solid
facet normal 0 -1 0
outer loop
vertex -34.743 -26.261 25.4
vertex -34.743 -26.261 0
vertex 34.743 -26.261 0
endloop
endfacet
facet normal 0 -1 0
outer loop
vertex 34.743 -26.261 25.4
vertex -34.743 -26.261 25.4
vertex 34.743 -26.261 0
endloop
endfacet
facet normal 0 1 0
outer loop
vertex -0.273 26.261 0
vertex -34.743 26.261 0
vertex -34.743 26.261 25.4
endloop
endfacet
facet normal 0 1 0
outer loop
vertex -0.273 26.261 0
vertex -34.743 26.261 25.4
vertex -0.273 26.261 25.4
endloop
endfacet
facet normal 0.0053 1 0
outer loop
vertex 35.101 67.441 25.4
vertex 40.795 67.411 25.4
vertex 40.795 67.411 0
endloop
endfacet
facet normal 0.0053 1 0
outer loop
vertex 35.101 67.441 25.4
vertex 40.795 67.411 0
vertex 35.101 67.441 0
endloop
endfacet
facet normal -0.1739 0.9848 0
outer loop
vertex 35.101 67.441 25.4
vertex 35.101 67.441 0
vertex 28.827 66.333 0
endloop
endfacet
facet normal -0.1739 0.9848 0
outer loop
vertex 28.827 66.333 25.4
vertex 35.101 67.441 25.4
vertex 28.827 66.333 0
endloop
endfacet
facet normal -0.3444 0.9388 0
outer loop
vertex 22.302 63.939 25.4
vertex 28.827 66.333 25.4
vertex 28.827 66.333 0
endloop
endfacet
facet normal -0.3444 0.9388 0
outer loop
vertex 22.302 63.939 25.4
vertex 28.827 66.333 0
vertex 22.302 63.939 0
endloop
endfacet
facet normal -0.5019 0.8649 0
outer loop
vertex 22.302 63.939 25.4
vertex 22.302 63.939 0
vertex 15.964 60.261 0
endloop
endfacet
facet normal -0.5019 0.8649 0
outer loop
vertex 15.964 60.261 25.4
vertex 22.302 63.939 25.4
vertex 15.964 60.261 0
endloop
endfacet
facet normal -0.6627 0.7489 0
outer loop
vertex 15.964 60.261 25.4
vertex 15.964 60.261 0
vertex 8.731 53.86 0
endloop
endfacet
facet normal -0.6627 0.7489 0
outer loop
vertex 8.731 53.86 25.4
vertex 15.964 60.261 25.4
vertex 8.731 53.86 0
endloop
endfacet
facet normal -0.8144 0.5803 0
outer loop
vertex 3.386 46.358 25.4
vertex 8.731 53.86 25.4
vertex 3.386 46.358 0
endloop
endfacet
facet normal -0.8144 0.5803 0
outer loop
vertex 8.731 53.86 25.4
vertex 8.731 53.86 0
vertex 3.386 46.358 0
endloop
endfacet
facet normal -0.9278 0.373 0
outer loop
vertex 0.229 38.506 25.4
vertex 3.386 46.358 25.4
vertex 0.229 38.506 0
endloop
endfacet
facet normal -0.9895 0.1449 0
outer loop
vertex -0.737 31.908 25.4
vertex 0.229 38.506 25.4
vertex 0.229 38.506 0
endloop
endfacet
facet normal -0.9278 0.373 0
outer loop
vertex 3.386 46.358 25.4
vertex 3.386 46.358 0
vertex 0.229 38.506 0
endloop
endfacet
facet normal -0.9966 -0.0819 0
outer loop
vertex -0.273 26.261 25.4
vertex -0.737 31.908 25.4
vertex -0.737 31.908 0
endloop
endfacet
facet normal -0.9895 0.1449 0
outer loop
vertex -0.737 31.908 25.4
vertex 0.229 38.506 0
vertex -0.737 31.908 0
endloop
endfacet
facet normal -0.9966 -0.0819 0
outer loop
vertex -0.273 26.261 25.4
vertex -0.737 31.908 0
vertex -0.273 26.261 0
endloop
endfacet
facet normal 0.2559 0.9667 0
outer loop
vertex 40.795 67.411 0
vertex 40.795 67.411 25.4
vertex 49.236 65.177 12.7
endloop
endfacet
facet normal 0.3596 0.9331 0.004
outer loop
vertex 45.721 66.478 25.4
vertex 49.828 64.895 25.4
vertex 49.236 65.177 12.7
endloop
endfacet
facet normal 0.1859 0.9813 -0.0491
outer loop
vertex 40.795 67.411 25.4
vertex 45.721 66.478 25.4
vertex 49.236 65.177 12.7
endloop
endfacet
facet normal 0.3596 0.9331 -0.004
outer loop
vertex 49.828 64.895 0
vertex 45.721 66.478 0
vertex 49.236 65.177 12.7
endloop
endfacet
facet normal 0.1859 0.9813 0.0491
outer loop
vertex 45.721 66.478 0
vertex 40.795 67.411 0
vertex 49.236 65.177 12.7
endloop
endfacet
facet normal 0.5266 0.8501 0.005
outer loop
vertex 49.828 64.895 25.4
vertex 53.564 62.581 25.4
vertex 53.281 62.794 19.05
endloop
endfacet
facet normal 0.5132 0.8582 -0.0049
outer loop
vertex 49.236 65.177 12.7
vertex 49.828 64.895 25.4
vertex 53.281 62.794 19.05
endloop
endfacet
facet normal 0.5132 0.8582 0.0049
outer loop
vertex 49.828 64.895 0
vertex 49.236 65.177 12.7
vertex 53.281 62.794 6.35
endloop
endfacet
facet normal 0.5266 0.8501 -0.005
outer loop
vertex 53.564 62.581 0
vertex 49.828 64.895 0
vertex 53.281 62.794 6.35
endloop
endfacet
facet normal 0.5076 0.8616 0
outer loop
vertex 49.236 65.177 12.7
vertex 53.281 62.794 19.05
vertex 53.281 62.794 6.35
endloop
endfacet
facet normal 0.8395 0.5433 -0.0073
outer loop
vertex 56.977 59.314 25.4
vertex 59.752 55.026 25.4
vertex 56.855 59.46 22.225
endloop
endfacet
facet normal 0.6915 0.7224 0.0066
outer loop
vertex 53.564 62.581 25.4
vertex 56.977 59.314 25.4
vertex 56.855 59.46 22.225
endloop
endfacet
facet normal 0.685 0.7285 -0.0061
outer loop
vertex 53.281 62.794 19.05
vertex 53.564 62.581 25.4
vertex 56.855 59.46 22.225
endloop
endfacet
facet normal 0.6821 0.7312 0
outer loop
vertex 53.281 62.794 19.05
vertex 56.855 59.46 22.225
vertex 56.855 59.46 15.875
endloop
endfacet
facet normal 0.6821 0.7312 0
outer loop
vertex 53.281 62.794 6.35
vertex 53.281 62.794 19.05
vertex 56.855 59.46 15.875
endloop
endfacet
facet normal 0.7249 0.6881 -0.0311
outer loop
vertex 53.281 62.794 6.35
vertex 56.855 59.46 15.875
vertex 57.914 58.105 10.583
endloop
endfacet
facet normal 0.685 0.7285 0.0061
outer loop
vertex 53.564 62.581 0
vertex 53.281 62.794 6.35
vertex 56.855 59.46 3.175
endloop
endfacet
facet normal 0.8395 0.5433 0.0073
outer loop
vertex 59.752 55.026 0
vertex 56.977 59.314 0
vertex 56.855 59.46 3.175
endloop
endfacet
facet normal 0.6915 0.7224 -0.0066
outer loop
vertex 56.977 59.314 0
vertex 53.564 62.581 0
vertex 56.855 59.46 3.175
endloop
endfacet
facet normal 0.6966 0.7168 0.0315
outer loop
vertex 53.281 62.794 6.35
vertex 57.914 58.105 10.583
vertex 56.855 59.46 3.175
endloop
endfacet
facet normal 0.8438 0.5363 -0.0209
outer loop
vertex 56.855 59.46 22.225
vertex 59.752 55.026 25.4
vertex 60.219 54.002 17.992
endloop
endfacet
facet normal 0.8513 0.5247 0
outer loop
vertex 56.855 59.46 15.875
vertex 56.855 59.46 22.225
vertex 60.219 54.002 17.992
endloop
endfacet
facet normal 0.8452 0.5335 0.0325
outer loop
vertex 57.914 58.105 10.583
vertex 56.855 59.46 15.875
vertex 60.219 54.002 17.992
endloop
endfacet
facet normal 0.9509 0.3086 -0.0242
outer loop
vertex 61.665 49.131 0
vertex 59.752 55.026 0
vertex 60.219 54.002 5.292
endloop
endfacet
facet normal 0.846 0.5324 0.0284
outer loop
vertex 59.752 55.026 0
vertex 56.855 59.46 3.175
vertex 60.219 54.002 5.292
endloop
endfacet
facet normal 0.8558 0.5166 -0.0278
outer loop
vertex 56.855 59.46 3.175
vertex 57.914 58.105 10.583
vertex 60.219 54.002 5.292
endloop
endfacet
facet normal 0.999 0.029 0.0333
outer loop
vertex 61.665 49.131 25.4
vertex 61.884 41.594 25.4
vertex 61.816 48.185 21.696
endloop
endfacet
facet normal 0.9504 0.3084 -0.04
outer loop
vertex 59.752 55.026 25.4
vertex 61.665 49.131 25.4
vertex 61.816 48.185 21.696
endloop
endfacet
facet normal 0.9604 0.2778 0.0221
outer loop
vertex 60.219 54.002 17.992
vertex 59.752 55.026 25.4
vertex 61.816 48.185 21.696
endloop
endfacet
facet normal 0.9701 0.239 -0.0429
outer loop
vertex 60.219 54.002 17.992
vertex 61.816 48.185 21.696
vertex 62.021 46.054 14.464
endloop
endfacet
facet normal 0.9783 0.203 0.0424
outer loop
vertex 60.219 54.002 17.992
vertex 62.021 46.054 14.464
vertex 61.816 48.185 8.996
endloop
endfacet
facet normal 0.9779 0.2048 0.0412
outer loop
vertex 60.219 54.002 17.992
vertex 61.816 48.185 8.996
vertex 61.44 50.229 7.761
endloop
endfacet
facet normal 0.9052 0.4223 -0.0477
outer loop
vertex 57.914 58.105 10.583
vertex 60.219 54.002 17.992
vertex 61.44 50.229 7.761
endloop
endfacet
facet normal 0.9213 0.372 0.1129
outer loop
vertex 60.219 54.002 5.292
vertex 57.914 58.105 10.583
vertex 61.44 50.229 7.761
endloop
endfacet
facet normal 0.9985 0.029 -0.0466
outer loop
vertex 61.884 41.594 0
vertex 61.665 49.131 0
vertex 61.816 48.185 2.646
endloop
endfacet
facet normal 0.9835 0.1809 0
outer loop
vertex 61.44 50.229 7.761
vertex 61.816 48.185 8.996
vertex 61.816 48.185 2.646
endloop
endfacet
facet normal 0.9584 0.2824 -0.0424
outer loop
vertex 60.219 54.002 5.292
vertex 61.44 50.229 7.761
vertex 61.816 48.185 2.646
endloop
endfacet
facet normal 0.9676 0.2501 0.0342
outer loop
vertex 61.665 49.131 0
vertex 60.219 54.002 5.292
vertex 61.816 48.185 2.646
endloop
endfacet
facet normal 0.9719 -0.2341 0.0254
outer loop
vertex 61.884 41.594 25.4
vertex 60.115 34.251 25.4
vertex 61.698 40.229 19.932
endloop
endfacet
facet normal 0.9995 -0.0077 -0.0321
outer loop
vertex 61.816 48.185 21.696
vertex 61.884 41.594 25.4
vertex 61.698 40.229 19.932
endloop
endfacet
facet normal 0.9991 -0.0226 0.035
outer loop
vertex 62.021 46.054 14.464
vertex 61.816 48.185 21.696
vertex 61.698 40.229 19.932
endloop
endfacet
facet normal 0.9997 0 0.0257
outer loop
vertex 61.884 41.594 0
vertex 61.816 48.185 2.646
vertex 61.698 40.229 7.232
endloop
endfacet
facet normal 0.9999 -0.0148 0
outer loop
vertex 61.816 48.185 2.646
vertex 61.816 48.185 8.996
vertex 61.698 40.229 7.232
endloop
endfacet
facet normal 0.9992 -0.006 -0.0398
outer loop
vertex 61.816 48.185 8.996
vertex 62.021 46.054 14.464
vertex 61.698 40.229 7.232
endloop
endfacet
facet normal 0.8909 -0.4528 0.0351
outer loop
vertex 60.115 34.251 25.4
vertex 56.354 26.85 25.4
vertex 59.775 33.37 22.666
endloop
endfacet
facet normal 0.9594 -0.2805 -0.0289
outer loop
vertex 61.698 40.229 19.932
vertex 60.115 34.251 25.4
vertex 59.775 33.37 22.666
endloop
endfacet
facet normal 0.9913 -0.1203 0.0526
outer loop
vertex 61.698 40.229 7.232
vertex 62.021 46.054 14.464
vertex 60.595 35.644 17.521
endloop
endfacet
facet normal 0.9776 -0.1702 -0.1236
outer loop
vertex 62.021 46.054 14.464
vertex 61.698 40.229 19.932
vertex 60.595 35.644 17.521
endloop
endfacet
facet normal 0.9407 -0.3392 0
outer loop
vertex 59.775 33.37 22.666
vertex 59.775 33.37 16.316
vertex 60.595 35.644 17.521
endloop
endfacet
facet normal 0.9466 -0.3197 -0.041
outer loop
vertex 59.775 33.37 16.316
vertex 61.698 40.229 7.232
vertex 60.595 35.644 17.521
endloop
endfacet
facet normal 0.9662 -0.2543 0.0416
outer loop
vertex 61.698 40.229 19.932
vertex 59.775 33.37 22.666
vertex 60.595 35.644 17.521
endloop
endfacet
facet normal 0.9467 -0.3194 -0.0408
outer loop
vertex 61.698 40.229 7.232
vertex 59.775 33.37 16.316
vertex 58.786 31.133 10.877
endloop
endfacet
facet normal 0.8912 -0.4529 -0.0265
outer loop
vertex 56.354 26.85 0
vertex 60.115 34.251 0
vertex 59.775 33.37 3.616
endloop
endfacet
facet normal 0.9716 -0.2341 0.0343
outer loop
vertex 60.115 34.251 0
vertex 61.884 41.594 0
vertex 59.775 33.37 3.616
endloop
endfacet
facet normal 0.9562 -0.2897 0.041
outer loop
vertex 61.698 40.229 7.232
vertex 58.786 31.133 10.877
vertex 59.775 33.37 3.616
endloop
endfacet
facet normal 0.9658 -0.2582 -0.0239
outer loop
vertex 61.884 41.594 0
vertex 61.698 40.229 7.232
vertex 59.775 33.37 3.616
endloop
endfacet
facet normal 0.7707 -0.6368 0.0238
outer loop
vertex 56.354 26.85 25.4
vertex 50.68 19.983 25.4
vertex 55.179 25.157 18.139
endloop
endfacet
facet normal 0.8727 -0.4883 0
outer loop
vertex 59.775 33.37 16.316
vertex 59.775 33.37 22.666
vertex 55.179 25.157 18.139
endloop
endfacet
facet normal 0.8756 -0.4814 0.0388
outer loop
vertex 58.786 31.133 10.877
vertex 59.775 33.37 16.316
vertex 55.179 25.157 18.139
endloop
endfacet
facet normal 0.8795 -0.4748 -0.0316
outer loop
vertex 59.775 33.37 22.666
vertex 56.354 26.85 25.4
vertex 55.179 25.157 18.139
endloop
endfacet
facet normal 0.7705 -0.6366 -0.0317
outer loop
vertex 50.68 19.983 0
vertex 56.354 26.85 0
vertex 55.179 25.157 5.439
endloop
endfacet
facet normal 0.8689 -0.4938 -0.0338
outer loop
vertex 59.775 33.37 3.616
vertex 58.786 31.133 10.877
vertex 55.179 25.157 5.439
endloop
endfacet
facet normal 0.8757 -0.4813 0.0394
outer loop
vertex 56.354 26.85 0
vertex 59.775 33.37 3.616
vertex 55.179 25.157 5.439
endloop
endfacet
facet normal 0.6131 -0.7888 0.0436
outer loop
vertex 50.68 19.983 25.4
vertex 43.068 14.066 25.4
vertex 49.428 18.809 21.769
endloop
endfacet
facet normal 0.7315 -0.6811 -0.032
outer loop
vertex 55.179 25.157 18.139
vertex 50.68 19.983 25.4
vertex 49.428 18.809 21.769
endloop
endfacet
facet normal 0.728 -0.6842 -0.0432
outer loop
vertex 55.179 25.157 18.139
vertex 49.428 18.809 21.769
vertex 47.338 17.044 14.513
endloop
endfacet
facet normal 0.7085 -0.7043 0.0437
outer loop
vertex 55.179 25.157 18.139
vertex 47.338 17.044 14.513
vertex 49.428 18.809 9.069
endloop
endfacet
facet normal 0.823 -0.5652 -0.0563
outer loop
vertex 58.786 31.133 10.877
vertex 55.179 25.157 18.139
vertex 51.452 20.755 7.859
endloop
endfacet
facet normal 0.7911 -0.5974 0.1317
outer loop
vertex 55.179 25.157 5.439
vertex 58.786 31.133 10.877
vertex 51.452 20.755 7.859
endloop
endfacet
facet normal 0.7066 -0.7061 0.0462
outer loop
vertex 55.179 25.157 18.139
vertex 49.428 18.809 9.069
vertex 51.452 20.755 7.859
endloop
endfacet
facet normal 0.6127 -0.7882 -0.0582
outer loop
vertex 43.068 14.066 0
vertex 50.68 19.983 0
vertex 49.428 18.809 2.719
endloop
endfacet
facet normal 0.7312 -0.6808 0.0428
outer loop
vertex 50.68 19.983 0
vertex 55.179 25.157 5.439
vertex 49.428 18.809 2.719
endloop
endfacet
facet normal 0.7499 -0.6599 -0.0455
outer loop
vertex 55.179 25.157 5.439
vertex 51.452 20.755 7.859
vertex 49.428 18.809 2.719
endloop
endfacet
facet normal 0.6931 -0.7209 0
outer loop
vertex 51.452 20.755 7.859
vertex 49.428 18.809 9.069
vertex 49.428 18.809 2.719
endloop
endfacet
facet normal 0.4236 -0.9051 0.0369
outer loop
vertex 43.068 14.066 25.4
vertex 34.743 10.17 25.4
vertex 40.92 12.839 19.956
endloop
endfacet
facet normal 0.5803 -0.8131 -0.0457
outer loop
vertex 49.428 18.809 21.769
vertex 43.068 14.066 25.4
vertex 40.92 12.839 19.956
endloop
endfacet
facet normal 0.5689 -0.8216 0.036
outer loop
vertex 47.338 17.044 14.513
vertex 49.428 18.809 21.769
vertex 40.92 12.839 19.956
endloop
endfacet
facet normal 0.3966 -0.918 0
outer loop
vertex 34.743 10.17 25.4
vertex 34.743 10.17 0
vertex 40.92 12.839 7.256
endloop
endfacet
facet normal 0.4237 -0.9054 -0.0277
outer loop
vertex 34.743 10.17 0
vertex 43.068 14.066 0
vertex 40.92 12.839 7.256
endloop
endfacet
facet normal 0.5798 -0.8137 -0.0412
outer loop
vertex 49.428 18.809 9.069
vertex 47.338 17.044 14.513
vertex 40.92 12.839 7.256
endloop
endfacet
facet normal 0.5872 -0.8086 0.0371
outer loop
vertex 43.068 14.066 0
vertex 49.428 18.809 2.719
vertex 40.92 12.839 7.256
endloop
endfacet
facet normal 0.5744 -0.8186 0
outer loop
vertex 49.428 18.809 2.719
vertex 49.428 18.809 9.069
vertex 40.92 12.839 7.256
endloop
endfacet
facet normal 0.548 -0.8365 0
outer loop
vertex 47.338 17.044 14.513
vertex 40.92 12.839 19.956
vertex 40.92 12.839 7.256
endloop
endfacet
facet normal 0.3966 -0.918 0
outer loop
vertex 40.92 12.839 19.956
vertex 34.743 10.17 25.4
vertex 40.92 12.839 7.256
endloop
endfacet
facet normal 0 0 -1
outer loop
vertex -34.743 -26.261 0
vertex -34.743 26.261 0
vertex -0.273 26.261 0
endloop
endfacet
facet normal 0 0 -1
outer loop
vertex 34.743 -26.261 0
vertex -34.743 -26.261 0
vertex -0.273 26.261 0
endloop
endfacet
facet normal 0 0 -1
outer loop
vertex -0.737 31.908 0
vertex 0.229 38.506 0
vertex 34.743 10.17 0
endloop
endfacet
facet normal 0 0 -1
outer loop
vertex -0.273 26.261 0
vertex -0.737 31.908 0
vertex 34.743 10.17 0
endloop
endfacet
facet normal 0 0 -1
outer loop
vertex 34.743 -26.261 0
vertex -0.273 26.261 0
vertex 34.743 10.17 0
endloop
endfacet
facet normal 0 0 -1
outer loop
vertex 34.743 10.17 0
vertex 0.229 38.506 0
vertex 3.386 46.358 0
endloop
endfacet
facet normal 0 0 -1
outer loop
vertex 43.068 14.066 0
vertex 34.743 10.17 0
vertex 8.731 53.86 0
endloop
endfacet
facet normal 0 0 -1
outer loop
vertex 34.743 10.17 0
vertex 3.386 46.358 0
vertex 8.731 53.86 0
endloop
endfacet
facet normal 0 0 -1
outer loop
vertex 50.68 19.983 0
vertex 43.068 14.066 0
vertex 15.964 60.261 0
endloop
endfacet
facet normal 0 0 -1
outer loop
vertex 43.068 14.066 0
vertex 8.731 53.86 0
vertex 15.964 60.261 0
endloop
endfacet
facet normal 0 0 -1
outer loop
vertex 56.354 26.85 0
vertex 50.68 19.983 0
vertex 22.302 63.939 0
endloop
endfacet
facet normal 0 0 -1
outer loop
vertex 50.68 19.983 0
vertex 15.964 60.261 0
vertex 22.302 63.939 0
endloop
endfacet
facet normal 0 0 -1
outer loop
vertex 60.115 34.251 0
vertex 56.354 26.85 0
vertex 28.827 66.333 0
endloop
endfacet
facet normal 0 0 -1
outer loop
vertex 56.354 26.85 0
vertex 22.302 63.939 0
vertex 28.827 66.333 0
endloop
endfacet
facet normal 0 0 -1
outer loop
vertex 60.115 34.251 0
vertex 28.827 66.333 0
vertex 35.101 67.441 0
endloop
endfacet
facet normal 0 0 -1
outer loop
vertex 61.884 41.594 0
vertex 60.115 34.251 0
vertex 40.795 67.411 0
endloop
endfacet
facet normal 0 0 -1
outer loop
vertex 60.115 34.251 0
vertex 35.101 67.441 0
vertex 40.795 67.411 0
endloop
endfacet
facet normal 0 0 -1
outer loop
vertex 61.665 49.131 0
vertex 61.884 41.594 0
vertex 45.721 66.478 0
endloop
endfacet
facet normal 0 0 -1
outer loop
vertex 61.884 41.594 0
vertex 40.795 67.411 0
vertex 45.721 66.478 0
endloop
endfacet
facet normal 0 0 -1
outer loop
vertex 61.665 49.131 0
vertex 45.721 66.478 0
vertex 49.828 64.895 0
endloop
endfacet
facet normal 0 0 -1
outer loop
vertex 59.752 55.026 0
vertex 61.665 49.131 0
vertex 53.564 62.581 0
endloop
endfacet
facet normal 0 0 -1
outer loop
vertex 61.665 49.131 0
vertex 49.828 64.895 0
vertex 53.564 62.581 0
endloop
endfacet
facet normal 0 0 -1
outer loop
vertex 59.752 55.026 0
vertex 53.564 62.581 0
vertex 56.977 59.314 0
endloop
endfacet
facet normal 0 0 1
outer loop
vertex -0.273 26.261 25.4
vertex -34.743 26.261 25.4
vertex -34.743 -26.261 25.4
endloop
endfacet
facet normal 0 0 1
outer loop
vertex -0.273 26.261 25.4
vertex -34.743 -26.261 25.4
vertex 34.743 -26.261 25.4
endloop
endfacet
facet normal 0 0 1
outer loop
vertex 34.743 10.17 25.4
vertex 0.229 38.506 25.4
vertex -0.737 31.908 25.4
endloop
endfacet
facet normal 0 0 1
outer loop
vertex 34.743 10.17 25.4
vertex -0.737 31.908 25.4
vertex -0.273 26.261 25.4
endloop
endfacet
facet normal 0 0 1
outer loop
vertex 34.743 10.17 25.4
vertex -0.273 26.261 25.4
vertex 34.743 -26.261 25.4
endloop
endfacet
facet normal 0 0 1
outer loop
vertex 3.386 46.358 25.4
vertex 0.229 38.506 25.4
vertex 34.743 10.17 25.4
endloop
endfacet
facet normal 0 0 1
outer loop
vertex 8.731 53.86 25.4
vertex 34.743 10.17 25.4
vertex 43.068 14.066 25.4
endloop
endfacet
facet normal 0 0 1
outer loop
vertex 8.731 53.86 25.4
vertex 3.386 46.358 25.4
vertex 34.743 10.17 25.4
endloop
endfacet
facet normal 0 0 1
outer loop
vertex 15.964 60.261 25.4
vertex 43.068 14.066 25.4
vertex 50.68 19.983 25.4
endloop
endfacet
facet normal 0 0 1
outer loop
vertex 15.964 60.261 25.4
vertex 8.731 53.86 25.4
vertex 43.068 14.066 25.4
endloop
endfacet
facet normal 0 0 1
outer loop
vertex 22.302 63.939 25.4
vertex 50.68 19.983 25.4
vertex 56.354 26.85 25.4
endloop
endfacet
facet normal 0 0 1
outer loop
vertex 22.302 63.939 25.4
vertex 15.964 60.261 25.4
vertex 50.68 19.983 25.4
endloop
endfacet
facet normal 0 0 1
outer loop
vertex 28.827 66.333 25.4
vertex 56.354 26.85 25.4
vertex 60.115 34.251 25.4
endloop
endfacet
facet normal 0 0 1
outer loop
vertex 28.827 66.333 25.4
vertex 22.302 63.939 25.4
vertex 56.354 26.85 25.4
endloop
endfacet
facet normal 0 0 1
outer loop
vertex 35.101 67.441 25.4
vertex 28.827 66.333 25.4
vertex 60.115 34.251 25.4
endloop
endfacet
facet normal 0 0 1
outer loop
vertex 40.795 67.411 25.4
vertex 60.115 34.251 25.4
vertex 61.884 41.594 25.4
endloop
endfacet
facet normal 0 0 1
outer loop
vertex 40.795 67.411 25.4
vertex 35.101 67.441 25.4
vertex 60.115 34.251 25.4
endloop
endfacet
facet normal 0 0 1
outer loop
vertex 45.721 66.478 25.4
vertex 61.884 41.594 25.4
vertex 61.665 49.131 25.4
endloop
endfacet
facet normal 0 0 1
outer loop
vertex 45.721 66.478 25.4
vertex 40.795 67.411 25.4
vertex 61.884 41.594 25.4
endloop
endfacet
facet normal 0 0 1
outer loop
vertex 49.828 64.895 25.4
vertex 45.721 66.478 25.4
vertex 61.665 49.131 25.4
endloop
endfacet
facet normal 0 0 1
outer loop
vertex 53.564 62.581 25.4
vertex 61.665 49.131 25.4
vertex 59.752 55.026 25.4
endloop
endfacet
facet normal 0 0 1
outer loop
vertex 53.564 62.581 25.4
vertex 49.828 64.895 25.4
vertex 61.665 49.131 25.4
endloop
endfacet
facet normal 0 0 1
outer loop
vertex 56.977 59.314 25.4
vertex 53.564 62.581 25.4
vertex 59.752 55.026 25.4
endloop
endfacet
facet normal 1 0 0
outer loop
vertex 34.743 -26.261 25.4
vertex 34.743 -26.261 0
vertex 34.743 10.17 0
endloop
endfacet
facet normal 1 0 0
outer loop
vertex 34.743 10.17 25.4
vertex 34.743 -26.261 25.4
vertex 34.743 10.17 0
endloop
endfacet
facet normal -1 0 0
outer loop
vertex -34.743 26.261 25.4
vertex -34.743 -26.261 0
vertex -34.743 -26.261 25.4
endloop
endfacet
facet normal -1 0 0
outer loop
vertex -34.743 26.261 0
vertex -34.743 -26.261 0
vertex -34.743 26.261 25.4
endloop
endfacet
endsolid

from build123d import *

# Parameters (mm, degrees)
F0_W     = 69.4850608706
F0_H     = 52.5225289166
F4_DEPTH = 25.4
F5_DEPTH = 25.4


# Not quite as in the source:
# - the program builds the solid bodies; features that only make, move or delete a surface that nothing else refers to are left out


with BuildPart() as f4:
    # F0 (on Top) → F4 (new body)
    with BuildSketch(Plane.XY):
        Rectangle(F0_W, F0_H)
    extrude(amount=F4_DEPTH)

    # F3 (on face) → F5 (join)
    with BuildSketch(Plane.XY):
        with BuildLine():
            Line((34.7425304353, 26.2612644583), (34.7425304353, 10.1695671882))
            add(Edge.make_bspline(
                [(34.7425304353, 10.1695671882), (112.2797997443, 36.2054211909), (49.2358666955, 65.1774495788), (-13.8080663534, 94.1494779666), (-0.2734467602, 26.2612644583)],
                knots=[1.1513743417, 1.1513743417, 1.1513743417, 3.5292771676, 3.5292771676, 5.9071799934, 5.9071799934, 5.9071799934], degree=2, weights=[1, 0.3726331435, 1, 0.3726331435, 1]))
            Line((-0.2734467602, 26.2612644583), (34.7425304353, 26.2612644583))
        make_face()
    extrude(amount=F5_DEPTH)


solid = f4.part
